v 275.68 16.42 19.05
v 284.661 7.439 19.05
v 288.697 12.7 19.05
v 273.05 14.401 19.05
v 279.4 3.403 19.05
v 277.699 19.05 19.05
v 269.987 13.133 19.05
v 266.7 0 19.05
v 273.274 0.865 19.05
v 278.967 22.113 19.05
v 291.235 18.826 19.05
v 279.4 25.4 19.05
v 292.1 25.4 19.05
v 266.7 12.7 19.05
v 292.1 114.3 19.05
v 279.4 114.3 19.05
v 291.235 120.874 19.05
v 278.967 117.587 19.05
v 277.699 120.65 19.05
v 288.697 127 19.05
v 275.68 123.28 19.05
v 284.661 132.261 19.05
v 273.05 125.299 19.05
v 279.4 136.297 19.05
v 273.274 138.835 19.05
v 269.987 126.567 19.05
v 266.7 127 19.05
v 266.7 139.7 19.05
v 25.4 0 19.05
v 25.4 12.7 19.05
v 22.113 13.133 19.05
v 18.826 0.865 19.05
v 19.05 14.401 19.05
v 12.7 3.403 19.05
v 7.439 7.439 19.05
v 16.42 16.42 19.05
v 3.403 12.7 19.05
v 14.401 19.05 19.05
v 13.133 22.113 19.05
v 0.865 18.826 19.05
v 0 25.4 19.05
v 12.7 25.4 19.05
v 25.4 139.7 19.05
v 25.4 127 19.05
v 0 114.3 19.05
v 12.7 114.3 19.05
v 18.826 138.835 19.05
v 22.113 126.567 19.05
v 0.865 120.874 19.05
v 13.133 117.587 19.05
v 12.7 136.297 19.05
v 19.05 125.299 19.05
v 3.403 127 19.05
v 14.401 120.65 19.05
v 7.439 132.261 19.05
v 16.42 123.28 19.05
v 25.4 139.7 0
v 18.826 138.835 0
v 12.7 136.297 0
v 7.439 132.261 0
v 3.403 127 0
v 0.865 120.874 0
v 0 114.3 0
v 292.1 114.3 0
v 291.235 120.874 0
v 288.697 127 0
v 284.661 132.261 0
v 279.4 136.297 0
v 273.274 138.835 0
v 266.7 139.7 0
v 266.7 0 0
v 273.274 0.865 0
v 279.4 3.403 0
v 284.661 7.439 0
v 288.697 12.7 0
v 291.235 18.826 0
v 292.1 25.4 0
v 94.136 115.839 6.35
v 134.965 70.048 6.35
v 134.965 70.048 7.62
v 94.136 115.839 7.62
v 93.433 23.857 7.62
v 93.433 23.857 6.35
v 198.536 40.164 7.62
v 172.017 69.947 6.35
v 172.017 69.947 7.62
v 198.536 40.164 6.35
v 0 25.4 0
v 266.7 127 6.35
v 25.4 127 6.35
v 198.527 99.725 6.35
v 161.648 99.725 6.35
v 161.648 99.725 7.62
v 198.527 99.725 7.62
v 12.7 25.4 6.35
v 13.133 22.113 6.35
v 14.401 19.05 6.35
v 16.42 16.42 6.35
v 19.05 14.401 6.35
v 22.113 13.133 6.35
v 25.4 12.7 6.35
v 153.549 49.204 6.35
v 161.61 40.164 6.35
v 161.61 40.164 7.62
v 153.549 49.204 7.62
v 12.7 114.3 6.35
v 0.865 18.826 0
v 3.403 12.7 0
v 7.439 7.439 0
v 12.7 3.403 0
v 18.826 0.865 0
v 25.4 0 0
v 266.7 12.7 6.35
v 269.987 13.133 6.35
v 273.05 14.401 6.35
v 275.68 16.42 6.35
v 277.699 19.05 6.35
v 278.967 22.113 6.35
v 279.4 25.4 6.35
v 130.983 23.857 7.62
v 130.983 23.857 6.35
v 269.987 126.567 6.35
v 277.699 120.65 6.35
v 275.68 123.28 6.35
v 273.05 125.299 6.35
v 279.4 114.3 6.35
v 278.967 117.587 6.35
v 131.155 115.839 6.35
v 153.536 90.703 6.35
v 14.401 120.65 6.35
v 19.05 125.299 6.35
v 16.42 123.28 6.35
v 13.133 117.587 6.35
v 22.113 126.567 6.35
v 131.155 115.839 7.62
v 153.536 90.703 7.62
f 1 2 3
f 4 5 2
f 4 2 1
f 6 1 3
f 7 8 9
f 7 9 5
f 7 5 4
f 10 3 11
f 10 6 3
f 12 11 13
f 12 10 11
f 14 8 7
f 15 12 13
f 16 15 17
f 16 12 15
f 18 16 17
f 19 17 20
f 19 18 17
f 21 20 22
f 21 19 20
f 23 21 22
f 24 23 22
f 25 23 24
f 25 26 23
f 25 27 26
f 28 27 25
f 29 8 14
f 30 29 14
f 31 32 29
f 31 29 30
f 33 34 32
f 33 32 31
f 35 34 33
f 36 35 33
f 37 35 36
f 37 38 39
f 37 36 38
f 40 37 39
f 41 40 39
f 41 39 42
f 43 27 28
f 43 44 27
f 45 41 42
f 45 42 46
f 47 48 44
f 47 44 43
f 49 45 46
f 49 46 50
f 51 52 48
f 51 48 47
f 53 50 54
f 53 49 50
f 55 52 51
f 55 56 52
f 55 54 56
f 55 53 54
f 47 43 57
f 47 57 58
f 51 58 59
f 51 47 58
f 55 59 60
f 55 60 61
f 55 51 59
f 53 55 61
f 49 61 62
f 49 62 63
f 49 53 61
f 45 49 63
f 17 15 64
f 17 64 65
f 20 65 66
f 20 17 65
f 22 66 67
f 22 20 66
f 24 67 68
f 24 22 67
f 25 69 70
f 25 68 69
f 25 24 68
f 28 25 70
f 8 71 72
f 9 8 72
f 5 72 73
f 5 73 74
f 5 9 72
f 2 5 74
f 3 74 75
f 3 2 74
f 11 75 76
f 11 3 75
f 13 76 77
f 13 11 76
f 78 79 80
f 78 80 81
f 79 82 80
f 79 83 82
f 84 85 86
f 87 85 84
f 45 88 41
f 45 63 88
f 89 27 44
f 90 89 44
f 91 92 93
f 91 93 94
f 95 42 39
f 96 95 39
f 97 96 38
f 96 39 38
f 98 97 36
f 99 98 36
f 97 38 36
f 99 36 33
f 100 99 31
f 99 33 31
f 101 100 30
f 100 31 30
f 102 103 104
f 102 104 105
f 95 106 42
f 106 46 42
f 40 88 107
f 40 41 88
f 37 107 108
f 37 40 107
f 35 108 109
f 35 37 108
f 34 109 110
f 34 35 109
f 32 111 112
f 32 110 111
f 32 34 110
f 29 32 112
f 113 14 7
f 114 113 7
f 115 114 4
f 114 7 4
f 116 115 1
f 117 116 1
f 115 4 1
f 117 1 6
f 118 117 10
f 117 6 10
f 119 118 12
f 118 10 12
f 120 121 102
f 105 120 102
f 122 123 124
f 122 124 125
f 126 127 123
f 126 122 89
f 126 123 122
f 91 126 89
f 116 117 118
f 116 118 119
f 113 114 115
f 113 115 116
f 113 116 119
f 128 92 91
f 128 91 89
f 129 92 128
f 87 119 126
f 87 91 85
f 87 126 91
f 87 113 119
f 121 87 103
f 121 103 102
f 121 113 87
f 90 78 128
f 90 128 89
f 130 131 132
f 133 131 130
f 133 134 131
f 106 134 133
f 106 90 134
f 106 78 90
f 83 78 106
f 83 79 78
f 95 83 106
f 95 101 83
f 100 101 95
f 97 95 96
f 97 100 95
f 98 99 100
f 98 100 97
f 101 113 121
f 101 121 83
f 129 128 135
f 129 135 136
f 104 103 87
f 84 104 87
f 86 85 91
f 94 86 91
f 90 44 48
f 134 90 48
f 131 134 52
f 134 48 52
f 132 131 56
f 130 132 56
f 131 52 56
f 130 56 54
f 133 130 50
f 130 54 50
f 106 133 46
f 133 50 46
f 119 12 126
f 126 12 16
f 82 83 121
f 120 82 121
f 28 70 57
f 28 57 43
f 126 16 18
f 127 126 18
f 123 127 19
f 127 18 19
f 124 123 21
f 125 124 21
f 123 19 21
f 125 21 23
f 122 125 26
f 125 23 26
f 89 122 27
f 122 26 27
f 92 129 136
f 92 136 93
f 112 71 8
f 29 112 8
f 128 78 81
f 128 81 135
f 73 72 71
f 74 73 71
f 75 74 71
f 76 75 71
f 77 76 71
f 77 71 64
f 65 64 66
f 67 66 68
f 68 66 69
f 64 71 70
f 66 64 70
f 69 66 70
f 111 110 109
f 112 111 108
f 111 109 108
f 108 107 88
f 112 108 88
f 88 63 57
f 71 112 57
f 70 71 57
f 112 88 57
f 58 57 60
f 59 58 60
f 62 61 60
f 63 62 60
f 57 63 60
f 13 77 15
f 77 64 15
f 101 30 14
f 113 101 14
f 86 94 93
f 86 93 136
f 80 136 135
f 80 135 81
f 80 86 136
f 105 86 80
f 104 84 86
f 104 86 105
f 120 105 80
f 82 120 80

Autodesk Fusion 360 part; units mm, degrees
box "BoxPrimitive1" add length 139.7 width 292.1 height 19.05 placed x (0, 1, 0) y (-1, 0, 0) z (0, 0, 1) at (292.1, 0, 0)
fillet "Fillet1" radius 25.4 4 edges at (0, 0, 9.525) (0, 139.7, 9.525) (292.1, 0, 9.525) (292.1, 139.7, 9.525)
sketch "Sketch2" plane through (0, 0, 19.05) normal (0, 0, 1) x (-1, 0, 0)
  arc A0 (-292.1, -114.3) -> (-266.7, -139.7) centre (-266.7, -114.3) ccw
  line L0 (-266.7, -139.7) -> (-25.4, -139.7)
  arc A1 (-25.4, -139.7) -> (0, -114.3) centre (-25.4, -114.3) ccw
  line L1 (0, -114.3) -> (0, -25.4)
  arc A2 (0, -25.4) -> (-25.4, 0) centre (-25.4, -25.4) ccw
  line L2 (-25.4, 0) -> (-266.7, 0)
  arc A3 (-266.7, 0) -> (-292.1, -25.4) centre (-266.7, -25.4) ccw
  line L3 (-292.1, -25.4) -> (-292.1, -114.3)
  line L4 (-12.7, -114.3) -> (-12.7, -25.4)
  arc A4 (-12.7, -25.4) -> (-25.4, -12.7) centre (-25.4, -25.4) ccw
  line L5 (-25.4, -12.7) -> (-266.7, -12.7)
  arc A5 (-266.7, -12.7) -> (-279.4, -25.4) centre (-266.7, -25.4) ccw
  line L6 (-279.4, -25.4) -> (-279.4, -114.3)
  arc A6 (-279.4, -114.3) -> (-266.7, -127) centre (-266.7, -114.3) ccw
  line L7 (-266.7, -127) -> (-25.4, -127)
  arc A7 (-25.4, -127) -> (-12.7, -114.3) centre (-25.4, -114.3) ccw
  point P0 (-292.1, 0)
  point P1 (0, -139.7)
extrude "Extrude1" cut sketch "Sketch2" against normal blind 12.7 contours L4 A4 L5 A5 L6 A6 L7 A7
sketch "Sketch3" plane through (0, 0, 6.35) normal (0, 0, 1) x (-1, 0, 0)
  arc A0 (-25.4, -127) -> (-12.7, -114.3) centre (-25.4, -114.3) ccw
  line L0 (-12.7, -114.3) -> (-12.7, -25.4)
  arc A1 (-12.7, -25.4) -> (-25.4, -12.7) centre (-25.4, -25.4) ccw
  line L1 (-25.4, -12.7) -> (-266.7, -12.7)
  arc A2 (-266.7, -12.7) -> (-279.4, -25.4) centre (-266.7, -25.4) ccw
  line L2 (-279.4, -25.4) -> (-279.4, -114.3)
  arc A3 (-279.4, -114.3) -> (-266.7, -127) centre (-266.7, -114.3) ccw
  line L3 (-266.7, -127) -> (-25.4, -127)
  line L4 (-94.1365, -115.8394) -> (-131.1548, -115.8394)
  line L5 (-161.648, -99.7247) -> (-198.5274, -99.7247)
  line L6 (-161.6096, -40.1639) -> (-198.5361, -40.1639)
  line L7 (-93.4326, -23.8572) -> (-130.9835, -23.8572)
  line L8 (-93.4326, -23.8572) -> (-134.9646, -70.048)
  line L9 (-153.5362, -90.703) -> (-161.648, -99.7247)
  line L10 (-161.6096, -40.1639) -> (-153.5494, -49.2039)
  line L11 (-134.9646, -70.048) -> (-94.1365, -115.8394)
  line L12 (-130.9835, -23.8572) -> (-153.5494, -49.2039)
  line L13 (-172.017, -69.9473) -> (-198.5274, -99.7247)
  line L14 (-131.1548, -115.8394) -> (-153.5362, -90.703)
  line L15 (-172.017, -69.9473) -> (-198.5361, -40.1639)
extrude "Extrude2" add sketch "Sketch3" along normal blind 1.27 contours L4 L5 L6 L7 L8 L9 L10 L11 L12 L13 L14 L15
